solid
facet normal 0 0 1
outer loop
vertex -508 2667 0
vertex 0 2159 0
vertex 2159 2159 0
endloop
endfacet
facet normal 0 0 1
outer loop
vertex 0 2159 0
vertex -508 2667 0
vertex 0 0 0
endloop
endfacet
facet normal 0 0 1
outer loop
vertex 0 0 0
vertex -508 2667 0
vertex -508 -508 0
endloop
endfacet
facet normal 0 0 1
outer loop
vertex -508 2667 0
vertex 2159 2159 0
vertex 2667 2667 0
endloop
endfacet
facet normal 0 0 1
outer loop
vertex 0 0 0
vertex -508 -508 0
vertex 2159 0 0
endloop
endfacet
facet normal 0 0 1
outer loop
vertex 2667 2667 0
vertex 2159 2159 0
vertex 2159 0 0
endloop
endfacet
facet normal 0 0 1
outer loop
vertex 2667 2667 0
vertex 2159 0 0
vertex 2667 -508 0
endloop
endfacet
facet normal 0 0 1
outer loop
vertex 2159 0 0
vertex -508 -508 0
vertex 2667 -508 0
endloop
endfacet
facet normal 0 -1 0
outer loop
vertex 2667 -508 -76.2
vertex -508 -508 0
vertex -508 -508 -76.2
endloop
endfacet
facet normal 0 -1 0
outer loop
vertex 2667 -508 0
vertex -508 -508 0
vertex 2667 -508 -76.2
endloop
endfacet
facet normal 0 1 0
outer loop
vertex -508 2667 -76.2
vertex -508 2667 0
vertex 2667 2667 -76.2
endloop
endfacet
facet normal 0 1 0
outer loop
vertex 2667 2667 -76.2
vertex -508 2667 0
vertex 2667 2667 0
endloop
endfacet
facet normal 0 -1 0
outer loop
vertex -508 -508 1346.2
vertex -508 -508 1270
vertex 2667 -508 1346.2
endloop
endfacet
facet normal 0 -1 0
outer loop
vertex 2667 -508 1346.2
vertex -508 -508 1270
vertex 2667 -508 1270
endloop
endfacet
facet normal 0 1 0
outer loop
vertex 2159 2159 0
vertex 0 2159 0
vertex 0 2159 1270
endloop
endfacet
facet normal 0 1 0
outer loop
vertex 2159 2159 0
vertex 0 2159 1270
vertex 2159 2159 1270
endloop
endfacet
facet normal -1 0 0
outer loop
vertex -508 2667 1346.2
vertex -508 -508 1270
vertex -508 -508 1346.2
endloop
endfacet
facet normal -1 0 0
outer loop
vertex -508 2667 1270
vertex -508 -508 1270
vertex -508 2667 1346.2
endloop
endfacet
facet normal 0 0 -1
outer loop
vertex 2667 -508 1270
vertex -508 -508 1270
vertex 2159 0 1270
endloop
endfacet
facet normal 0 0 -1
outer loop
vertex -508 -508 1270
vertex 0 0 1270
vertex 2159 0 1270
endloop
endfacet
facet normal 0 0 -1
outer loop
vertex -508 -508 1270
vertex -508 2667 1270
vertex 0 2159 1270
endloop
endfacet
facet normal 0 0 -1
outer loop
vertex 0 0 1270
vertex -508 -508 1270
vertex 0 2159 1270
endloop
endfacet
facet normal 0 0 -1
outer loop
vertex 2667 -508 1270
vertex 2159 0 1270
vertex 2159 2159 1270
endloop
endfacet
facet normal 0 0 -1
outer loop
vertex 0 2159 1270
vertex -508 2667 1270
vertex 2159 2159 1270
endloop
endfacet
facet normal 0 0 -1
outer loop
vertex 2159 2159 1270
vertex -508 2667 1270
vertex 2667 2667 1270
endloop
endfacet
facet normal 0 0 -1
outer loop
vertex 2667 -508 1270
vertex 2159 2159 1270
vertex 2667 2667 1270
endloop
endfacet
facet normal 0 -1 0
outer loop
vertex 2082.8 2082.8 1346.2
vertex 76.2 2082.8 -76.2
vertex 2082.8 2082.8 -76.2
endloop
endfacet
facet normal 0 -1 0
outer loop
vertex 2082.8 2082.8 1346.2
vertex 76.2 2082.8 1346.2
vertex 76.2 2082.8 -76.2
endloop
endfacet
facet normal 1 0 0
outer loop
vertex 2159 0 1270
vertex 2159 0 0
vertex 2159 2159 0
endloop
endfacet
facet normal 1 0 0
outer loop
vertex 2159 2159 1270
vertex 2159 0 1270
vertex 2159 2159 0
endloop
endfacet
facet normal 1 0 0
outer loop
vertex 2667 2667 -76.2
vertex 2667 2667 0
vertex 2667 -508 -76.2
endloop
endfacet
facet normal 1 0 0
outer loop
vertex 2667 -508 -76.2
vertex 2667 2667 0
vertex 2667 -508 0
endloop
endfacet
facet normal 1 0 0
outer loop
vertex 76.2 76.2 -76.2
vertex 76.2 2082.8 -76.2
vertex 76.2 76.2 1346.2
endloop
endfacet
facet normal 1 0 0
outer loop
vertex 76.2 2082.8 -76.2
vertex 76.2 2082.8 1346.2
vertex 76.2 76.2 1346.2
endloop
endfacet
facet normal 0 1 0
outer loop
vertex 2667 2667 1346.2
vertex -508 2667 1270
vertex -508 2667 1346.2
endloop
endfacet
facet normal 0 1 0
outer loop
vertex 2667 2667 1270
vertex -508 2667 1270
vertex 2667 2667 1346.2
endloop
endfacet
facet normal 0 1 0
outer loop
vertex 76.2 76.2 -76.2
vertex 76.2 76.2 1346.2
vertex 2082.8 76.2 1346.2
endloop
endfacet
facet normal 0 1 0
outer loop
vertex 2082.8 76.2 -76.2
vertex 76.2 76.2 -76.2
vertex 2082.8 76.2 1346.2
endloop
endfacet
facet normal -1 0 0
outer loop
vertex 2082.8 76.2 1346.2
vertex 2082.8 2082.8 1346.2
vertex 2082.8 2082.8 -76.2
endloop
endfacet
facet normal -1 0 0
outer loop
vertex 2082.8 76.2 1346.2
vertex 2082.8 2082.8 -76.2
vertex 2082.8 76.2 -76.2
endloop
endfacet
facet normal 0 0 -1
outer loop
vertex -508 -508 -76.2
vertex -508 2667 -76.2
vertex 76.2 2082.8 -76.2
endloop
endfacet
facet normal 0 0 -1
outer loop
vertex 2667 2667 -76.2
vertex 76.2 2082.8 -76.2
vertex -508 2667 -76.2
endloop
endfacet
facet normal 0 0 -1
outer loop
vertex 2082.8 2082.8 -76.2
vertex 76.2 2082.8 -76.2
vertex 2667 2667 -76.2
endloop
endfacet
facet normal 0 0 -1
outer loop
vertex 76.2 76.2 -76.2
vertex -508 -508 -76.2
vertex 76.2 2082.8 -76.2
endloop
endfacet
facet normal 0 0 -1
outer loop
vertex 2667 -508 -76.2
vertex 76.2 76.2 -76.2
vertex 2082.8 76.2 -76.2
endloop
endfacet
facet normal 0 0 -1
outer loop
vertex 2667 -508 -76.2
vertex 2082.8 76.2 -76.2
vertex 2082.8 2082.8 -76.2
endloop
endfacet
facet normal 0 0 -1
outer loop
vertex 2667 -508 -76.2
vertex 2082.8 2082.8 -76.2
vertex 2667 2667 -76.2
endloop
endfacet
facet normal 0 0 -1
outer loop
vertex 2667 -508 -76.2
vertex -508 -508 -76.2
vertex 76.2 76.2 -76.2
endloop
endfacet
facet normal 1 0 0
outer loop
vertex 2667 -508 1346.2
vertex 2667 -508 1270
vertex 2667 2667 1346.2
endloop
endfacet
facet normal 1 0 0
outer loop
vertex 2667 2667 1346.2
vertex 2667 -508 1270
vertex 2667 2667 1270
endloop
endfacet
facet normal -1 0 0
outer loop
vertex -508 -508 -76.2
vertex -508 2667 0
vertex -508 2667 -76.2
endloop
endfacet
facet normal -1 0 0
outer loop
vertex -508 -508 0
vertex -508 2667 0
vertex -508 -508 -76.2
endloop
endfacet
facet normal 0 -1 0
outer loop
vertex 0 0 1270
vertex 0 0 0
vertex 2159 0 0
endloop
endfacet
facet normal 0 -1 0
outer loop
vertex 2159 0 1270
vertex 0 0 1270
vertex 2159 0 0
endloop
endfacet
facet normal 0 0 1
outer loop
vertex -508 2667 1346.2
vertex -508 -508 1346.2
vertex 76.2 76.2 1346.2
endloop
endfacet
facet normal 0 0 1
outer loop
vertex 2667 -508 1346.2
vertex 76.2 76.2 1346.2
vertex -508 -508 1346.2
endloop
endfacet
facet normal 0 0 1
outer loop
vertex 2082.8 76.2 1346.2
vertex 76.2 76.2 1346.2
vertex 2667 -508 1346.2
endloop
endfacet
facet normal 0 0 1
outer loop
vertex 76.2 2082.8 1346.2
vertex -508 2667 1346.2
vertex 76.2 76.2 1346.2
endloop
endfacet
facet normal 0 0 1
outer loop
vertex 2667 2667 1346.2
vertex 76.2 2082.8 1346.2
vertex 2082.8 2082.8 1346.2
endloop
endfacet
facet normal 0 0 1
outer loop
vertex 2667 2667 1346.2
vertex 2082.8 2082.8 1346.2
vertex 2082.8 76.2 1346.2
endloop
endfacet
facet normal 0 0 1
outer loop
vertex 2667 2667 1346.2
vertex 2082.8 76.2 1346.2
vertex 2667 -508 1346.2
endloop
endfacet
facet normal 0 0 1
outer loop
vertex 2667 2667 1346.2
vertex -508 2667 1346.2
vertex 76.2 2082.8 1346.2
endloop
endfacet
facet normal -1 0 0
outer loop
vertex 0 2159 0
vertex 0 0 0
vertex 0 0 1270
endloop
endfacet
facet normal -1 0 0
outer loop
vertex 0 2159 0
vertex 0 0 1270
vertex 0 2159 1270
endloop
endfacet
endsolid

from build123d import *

# Parameters (mm, degrees)
F0_W     = 2159
F0_H     = 2159
F0_W_2   = 2006.6
F0_H_2   = 2006.6
F1_DEPTH = 1270
F2_W     = 3175
F2_H     = 3175
F2_W_2   = 2006.6
F2_H_2   = 2006.6
F3_DEPTH = 76.2
F4_W     = 3175
F4_H     = 3175
F4_W_2   = 2006.6
F4_H_2   = 2006.6
F5_DEPTH = 76.2


with BuildPart() as f1:
    # F0 (on Top) → F1 (new body)
    with BuildSketch(Plane.XY):
        with Locations((1079.5, 1079.5)):
            Rectangle(F0_W, F0_H)
        with Locations((1079.5, 1079.5)):
            Rectangle(F0_W_2, F0_H_2, mode=Mode.SUBTRACT)
    extrude(amount=F1_DEPTH)

    # F2 (on face) → F3 (join)
    with BuildSketch(Plane.XY.offset(1270)):
        with Locations((1079.5, 1079.5)):
            Rectangle(F2_W, F2_H)
        with Locations((1079.5, 1079.5)):
            Rectangle(F2_W_2, F2_H_2, mode=Mode.SUBTRACT)
    extrude(amount=F3_DEPTH)

    # F4 (on face) → F5 (join)
    with BuildSketch(Plane(origin=(0, 0, 0), x_dir=(1, 0, 0), z_dir=(0, 0, -1))):
        with Locations((1079.5, -1079.5)):
            Rectangle(F4_W, F4_H)
        with Locations((1079.5, -1079.5)):
            Rectangle(F4_W_2, F4_H_2, mode=Mode.SUBTRACT)
    extrude(amount=F5_DEPTH)


solid = f1.part
